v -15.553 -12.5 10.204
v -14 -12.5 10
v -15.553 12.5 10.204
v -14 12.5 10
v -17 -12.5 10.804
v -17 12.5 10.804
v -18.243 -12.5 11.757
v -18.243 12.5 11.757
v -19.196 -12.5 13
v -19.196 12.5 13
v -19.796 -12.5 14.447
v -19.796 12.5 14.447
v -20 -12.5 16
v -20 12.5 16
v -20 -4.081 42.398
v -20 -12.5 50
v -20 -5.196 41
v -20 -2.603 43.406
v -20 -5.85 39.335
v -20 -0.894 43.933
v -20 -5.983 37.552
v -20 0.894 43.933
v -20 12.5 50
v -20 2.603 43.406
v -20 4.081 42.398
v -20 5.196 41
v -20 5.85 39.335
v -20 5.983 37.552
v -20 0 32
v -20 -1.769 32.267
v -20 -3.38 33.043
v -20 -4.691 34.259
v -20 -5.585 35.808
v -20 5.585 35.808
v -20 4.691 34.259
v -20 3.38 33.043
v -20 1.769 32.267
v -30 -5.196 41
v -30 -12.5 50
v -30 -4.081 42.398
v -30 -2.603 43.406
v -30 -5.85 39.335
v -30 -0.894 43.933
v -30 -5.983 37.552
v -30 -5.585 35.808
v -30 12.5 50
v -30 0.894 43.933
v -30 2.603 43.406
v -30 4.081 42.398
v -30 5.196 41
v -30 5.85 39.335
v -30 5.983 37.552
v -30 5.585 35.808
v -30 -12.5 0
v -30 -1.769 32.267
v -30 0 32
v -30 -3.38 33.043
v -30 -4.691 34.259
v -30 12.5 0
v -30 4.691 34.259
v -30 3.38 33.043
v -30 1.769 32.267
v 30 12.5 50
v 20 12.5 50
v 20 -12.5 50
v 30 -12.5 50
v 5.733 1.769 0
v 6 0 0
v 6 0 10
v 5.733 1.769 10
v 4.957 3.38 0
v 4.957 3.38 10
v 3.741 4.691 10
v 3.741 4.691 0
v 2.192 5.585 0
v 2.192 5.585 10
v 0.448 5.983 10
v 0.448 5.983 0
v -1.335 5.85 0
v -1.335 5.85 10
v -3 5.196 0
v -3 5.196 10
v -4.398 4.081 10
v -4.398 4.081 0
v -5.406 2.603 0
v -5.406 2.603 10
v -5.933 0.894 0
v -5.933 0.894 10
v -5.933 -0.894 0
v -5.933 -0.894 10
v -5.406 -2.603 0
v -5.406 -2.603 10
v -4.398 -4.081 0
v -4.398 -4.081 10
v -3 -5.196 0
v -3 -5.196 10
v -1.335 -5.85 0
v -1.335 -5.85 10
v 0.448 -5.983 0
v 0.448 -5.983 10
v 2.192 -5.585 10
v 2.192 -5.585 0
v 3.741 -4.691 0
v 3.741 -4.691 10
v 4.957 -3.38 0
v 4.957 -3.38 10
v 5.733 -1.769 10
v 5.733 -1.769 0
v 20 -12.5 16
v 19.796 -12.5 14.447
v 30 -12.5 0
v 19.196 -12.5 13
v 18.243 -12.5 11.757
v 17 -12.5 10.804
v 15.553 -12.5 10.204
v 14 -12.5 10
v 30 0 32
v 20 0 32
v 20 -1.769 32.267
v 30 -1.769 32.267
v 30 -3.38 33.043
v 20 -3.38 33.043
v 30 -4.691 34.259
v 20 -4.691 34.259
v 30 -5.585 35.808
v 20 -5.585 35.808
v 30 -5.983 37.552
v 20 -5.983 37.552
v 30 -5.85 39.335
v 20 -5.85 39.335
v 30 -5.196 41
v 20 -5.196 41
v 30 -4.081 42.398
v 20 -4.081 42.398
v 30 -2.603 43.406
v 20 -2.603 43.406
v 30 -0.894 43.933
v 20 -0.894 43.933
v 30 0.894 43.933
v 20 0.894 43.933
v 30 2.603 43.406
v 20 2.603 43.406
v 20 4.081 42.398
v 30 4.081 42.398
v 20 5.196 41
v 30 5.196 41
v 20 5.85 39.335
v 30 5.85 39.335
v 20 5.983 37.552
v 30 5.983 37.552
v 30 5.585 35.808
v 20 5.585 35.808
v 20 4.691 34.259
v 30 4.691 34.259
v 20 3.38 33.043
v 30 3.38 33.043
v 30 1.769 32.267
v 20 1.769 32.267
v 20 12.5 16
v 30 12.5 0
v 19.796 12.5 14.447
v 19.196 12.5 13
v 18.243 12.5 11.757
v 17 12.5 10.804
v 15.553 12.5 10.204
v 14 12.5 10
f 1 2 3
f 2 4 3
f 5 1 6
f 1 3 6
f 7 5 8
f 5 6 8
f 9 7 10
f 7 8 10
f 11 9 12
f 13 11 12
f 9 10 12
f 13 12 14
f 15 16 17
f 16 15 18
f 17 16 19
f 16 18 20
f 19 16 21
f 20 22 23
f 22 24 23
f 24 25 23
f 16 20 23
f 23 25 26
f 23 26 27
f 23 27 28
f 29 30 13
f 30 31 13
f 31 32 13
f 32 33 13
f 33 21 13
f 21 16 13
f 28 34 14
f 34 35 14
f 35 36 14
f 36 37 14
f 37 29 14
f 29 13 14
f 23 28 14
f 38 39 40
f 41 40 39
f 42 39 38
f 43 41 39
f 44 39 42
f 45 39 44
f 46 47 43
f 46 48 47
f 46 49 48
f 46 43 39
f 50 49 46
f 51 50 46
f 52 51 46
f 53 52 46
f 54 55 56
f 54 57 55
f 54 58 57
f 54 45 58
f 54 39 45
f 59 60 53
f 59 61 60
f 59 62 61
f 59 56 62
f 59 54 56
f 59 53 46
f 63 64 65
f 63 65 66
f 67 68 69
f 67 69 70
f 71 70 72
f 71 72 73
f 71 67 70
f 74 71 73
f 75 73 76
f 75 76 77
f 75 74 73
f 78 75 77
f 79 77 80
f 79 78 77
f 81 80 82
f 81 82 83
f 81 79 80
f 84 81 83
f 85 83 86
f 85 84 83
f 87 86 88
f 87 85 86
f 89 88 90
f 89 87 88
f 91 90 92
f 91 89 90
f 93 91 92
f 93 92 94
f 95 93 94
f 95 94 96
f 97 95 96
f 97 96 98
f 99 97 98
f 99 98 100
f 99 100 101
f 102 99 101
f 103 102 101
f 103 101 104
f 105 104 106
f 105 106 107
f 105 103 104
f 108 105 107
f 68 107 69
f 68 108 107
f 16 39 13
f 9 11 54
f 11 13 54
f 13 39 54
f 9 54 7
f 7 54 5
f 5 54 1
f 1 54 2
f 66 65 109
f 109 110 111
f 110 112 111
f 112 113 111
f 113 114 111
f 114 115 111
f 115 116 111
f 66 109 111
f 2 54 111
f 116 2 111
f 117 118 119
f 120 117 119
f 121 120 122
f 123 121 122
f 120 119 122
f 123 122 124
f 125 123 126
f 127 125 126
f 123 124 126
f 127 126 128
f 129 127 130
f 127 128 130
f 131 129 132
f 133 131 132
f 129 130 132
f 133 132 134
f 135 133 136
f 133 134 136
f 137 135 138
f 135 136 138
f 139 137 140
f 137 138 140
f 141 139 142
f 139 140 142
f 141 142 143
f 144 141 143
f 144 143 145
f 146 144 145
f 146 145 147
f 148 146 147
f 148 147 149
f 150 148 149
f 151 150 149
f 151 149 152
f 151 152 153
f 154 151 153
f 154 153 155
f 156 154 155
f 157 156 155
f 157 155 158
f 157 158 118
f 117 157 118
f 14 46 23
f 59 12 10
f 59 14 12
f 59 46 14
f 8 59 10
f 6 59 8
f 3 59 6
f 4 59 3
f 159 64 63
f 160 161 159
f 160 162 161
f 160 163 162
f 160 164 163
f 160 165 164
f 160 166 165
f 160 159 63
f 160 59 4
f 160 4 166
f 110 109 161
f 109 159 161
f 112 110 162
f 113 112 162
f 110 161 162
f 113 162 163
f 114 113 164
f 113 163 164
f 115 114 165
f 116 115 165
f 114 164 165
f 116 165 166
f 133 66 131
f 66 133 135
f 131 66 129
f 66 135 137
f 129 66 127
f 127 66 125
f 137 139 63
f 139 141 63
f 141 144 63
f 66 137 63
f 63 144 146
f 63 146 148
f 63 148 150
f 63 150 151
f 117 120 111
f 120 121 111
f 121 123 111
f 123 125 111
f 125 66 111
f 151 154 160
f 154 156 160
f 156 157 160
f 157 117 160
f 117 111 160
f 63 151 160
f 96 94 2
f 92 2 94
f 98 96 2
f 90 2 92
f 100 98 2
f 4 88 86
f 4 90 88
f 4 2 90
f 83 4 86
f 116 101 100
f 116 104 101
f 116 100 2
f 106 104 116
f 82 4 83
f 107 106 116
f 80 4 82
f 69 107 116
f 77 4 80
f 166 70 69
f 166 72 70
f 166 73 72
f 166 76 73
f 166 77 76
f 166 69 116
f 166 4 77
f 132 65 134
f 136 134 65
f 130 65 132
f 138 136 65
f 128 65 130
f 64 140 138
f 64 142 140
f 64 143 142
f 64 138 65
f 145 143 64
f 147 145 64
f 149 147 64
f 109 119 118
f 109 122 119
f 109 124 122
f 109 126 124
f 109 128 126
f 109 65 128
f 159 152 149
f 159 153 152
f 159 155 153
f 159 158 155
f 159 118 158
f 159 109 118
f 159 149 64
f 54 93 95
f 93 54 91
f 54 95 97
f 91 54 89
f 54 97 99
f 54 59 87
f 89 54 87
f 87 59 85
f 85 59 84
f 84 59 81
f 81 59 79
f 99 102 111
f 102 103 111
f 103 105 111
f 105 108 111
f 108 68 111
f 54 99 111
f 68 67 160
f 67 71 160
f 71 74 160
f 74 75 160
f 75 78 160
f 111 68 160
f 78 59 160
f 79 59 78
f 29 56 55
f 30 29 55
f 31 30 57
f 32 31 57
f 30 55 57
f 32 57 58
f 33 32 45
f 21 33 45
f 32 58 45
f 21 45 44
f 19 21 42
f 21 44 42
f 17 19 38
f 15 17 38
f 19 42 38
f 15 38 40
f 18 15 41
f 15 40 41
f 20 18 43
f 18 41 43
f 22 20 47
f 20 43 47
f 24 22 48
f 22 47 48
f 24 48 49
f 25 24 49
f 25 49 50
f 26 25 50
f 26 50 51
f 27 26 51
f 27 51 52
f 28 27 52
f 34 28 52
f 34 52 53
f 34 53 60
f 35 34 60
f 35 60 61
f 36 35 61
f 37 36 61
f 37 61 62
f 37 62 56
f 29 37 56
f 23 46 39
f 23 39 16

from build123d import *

# Parameters (mm, degrees)
SZKIC1_W                    = 60
SZKIC1_H                    = 25
SZKIC1_R                    = 6
DODANIE_WYCI_GNI_CIE1_DEPTH = 10
SZKIC2_W                    = 10
SZKIC2_H                    = 25
DODANIE_WYCI_GNI_CIE2_DEPTH = 40
ZAOKR_GLENIE1_R             = 6
SZKIC3_R                    = 6
WYTNIJ_WYCI_GNI_CIE1_DEPTH  = 70


with BuildPart() as part:
    # Szkic1 → Dodanie-wyciągnięcie1 (new body)
    with BuildSketch(Plane.XY):
        Rectangle(SZKIC1_W, SZKIC1_H)
        Circle(SZKIC1_R, mode=Mode.SUBTRACT)
    extrude(amount=DODANIE_WYCI_GNI_CIE1_DEPTH)

    # Szkic2 → Dodanie-wyciągnięcie2 (add)
    with BuildSketch(Plane.XY.offset(10)):
        with Locations((-25, 0)):
            Rectangle(SZKIC2_W, SZKIC2_H)
        with Locations((25, 0)):
            Rectangle(SZKIC2_W, SZKIC2_H)
    extrude(amount=DODANIE_WYCI_GNI_CIE2_DEPTH)

    # Zaokrąglenie1
    zaokr_glenie1_edges = [part.edges().sort_by_distance(p)[0] for p in [
        (-20, 0, 10),
        (20, 0, 10),
    ]]
    fillet(zaokr_glenie1_edges, radius=ZAOKR_GLENIE1_R)

    # Szkic3 → Wytnij-wyciągnięcie1 (cut)
    with BuildSketch(Plane.ZY.offset(30)):
        with Locations(Location((38, 0, 0), (0, 0, 180))):
            Circle(SZKIC3_R)
    extrude(amount=-WYTNIJ_WYCI_GNI_CIE1_DEPTH, mode=Mode.SUBTRACT)


solid = part.part
